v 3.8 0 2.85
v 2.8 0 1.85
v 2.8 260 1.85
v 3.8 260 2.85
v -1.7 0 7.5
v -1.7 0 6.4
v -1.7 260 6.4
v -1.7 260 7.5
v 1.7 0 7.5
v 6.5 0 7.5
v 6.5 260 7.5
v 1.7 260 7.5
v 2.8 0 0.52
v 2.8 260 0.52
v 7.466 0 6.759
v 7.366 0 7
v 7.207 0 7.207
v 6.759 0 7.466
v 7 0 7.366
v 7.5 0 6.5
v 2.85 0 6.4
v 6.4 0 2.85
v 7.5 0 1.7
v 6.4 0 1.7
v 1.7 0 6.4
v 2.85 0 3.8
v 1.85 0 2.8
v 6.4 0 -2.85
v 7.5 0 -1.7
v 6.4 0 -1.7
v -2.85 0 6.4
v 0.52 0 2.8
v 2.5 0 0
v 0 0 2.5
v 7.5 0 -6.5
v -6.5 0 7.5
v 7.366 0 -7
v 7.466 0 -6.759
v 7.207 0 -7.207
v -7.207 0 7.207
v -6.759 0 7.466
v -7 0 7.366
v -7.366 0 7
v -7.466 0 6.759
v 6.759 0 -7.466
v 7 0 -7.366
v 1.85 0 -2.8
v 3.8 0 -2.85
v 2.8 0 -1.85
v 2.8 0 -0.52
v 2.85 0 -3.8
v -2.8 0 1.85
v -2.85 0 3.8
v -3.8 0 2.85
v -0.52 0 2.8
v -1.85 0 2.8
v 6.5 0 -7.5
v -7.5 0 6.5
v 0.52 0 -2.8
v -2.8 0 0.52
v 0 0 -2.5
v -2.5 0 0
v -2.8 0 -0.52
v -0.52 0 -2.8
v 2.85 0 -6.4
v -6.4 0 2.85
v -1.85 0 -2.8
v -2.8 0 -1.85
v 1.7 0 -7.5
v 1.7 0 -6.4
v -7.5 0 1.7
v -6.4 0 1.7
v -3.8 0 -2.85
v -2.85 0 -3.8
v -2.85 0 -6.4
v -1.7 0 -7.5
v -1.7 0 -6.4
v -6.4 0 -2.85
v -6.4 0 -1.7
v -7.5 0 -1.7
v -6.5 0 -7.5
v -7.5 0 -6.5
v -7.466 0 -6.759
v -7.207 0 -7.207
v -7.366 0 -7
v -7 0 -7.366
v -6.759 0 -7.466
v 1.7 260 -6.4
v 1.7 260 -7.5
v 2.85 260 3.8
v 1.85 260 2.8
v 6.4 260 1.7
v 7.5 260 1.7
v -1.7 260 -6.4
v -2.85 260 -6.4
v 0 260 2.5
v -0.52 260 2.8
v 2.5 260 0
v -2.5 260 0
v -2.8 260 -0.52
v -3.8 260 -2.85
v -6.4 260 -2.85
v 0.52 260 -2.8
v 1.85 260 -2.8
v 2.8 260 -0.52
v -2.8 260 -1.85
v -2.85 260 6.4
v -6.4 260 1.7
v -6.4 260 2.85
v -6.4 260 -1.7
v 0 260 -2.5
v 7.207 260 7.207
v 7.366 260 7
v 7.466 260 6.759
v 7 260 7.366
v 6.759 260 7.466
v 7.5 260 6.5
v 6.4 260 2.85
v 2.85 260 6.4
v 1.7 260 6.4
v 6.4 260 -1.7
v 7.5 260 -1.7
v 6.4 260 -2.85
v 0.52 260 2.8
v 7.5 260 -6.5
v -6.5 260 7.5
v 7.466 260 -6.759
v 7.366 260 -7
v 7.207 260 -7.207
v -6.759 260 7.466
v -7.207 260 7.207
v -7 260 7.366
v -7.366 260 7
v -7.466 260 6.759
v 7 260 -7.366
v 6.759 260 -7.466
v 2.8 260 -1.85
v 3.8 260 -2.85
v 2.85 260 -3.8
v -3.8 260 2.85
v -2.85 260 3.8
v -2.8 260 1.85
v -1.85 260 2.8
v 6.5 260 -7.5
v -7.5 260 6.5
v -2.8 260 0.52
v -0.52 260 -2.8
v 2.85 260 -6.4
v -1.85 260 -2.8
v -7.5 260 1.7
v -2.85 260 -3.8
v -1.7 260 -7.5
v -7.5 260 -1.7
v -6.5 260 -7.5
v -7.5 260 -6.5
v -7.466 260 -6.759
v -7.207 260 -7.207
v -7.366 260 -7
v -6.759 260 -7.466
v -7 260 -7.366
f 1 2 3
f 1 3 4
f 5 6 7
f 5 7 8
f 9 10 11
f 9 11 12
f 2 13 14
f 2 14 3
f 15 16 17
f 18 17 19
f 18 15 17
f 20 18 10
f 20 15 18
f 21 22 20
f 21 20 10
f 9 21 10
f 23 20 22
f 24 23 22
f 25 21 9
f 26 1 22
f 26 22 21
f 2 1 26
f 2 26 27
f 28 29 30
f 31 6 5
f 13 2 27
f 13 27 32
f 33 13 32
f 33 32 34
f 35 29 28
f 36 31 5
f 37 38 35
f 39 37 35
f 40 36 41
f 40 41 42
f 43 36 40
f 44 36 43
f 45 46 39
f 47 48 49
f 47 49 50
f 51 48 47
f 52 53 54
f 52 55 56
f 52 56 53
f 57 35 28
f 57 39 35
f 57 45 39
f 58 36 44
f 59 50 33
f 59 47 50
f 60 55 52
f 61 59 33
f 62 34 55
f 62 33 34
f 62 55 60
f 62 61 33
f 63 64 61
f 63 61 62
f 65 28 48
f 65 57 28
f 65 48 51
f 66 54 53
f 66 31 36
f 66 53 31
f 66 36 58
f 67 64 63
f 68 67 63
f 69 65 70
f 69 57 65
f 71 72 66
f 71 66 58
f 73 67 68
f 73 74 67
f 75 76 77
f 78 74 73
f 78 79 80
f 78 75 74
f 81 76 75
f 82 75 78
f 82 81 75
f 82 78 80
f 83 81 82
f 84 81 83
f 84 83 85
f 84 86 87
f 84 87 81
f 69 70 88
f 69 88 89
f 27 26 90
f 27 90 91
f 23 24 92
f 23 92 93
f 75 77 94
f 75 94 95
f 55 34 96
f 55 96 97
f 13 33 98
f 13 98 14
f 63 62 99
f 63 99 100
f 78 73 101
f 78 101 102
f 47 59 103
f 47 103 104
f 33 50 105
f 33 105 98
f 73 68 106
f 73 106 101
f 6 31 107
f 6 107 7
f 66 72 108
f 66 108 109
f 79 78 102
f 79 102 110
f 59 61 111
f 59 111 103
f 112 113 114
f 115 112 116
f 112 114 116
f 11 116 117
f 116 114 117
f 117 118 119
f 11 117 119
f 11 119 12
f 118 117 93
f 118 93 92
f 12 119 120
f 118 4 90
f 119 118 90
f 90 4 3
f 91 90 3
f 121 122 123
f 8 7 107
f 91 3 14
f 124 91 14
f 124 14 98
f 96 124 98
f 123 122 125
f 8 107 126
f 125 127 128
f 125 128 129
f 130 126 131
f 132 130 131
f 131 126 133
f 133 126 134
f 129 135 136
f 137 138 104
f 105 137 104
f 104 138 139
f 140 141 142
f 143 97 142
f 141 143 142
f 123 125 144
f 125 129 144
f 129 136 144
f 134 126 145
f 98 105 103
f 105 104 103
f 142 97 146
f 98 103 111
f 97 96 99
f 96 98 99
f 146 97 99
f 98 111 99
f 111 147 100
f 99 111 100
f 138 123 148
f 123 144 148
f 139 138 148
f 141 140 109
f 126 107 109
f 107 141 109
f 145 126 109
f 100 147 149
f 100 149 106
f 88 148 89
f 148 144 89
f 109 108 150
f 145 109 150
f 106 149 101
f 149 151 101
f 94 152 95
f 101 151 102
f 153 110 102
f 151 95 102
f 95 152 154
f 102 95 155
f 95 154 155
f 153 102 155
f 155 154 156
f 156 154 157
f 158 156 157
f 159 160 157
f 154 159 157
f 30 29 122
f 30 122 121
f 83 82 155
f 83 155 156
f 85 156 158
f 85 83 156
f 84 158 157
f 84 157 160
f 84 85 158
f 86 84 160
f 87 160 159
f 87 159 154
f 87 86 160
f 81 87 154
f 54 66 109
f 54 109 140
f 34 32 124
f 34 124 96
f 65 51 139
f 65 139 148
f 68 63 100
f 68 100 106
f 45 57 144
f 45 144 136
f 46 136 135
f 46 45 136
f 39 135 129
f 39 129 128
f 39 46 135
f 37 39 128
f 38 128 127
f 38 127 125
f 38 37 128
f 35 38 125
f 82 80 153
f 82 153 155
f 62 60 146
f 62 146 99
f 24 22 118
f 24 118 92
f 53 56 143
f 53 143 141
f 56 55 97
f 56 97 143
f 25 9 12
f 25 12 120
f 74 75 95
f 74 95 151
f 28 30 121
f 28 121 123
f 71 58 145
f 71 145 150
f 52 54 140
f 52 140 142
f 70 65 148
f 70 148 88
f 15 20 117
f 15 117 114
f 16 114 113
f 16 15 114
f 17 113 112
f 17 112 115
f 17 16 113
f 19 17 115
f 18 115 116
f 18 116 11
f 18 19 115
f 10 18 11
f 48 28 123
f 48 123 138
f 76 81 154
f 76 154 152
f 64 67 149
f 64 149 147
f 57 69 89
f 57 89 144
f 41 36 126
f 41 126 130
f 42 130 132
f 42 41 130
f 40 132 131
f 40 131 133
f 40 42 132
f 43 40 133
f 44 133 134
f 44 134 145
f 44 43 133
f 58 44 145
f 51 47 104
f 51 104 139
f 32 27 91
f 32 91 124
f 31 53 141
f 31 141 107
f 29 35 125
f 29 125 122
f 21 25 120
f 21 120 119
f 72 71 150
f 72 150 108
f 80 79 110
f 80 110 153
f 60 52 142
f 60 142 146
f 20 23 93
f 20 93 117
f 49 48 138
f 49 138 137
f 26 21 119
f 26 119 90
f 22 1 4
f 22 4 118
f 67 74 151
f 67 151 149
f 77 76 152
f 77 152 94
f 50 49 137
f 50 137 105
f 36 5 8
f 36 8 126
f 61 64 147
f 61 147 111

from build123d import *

# Parameters (mm, degrees)
BOSS_EXTRUDE1_DEPTH = 260


with BuildPart() as part:
    # Sketch2 → Boss-Extrude1 (new body)
    with BuildSketch(Plane(origin=(0, 0, 0), x_dir=(1, 0, 0), z_dir=(0, 1, 0))):
        with BuildLine():
            Line((1.7, 7.5), (6.5, 7.5))
            ThreePointArc((6.5, 7.5), (7.207106781, 7.207106781), (7.5, 6.5))
            Line((7.5, 6.5), (7.5, 1.7))
            Line((7.5, 1.7), (6.4, 1.7))
            Line((6.4, 1.7), (6.4, 2.85))
            Line((6.4, 2.85), (3.8, 2.85))
            Line((3.8, 2.85), (2.8, 1.85))
            Line((2.8, 1.85), (2.8, 0.519615242))
            Line((2.8, 0.519615242), (2.5, 0))
            Line((2.5, 0), (2.8, -0.519615242))
            Line((2.8, -0.519615242), (2.8, -1.85))
            Line((2.8, -1.85), (3.8, -2.85))
            Line((3.8, -2.85), (6.4, -2.85))
            Line((6.4, -2.85), (6.4, -1.7))
            Line((6.4, -1.7), (7.5, -1.7))
            Line((7.5, -1.7), (7.5, -6.5))
            ThreePointArc((7.5, -6.5), (7.207106781, -7.207106781), (6.5, -7.5))
            Line((6.5, -7.5), (1.7, -7.5))
            Line((1.7, -7.5), (1.7, -6.4))
            Line((1.7, -6.4), (2.85, -6.4))
            Line((2.85, -6.4), (2.85, -3.8))
            Line((2.85, -3.8), (1.85, -2.8))
            Line((1.85, -2.8), (0.519615242, -2.8))
            Line((0.519615242, -2.8), (0, -2.5))
            Line((0, -2.5), (-0.519615242, -2.8))
            Line((-0.519615242, -2.8), (-1.85, -2.8))
            Line((-1.85, -2.8), (-2.85, -3.8))
            Line((-2.85, -3.8), (-2.85, -6.4))
            Line((-2.85, -6.4), (-1.7, -6.4))
            Line((-1.7, -6.4), (-1.7, -7.5))
            Line((-1.7, -7.5), (-6.5, -7.5))
            ThreePointArc((-6.5, -7.5), (-7.207106781, -7.207106781), (-7.5, -6.5))
            Line((-7.5, -6.5), (-7.5, -1.7))
            Line((-7.5, -1.7), (-6.4, -1.7))
            Line((-6.4, -1.7), (-6.4, -2.85))
            Line((-6.4, -2.85), (-3.8, -2.85))
            Line((-3.8, -2.85), (-2.8, -1.85))
            Line((-2.8, -1.85), (-2.8, -0.519615242))
            Line((-2.8, -0.519615242), (-2.5, 0))
            Line((-2.5, 0), (-2.8, 0.519615242))
            Line((-2.8, 0.519615242), (-2.8, 1.85))
            Line((-2.8, 1.85), (-3.8, 2.85))
            Line((-3.8, 2.85), (-6.4, 2.85))
            Line((-6.4, 2.85), (-6.4, 1.7))
            Line((-6.4, 1.7), (-7.5, 1.7))
            Line((-7.5, 1.7), (-7.5, 6.5))
            ThreePointArc((-7.5, 6.5), (-7.207106781, 7.207106781), (-6.5, 7.5))
            Line((-6.5, 7.5), (-1.7, 7.5))
            Line((-1.7, 7.5), (-1.7, 6.4))
            Line((-1.7, 6.4), (-2.85, 6.4))
            Line((-2.85, 6.4), (-2.85, 3.8))
            Line((-2.85, 3.8), (-1.85, 2.8))
            Line((-1.85, 2.8), (-0.519615242, 2.8))
            Line((-0.519615242, 2.8), (0, 2.5))
            Line((0, 2.5), (0.519615242, 2.8))
            Line((0.519615242, 2.8), (1.85, 2.8))
            Line((1.85, 2.8), (2.85, 3.8))
            Line((2.85, 3.8), (2.85, 6.4))
            Line((2.85, 6.4), (1.7, 6.4))
            Line((1.7, 6.4), (1.7, 7.5))
        make_face()
    extrude(amount=BOSS_EXTRUDE1_DEPTH)


solid = part.part
